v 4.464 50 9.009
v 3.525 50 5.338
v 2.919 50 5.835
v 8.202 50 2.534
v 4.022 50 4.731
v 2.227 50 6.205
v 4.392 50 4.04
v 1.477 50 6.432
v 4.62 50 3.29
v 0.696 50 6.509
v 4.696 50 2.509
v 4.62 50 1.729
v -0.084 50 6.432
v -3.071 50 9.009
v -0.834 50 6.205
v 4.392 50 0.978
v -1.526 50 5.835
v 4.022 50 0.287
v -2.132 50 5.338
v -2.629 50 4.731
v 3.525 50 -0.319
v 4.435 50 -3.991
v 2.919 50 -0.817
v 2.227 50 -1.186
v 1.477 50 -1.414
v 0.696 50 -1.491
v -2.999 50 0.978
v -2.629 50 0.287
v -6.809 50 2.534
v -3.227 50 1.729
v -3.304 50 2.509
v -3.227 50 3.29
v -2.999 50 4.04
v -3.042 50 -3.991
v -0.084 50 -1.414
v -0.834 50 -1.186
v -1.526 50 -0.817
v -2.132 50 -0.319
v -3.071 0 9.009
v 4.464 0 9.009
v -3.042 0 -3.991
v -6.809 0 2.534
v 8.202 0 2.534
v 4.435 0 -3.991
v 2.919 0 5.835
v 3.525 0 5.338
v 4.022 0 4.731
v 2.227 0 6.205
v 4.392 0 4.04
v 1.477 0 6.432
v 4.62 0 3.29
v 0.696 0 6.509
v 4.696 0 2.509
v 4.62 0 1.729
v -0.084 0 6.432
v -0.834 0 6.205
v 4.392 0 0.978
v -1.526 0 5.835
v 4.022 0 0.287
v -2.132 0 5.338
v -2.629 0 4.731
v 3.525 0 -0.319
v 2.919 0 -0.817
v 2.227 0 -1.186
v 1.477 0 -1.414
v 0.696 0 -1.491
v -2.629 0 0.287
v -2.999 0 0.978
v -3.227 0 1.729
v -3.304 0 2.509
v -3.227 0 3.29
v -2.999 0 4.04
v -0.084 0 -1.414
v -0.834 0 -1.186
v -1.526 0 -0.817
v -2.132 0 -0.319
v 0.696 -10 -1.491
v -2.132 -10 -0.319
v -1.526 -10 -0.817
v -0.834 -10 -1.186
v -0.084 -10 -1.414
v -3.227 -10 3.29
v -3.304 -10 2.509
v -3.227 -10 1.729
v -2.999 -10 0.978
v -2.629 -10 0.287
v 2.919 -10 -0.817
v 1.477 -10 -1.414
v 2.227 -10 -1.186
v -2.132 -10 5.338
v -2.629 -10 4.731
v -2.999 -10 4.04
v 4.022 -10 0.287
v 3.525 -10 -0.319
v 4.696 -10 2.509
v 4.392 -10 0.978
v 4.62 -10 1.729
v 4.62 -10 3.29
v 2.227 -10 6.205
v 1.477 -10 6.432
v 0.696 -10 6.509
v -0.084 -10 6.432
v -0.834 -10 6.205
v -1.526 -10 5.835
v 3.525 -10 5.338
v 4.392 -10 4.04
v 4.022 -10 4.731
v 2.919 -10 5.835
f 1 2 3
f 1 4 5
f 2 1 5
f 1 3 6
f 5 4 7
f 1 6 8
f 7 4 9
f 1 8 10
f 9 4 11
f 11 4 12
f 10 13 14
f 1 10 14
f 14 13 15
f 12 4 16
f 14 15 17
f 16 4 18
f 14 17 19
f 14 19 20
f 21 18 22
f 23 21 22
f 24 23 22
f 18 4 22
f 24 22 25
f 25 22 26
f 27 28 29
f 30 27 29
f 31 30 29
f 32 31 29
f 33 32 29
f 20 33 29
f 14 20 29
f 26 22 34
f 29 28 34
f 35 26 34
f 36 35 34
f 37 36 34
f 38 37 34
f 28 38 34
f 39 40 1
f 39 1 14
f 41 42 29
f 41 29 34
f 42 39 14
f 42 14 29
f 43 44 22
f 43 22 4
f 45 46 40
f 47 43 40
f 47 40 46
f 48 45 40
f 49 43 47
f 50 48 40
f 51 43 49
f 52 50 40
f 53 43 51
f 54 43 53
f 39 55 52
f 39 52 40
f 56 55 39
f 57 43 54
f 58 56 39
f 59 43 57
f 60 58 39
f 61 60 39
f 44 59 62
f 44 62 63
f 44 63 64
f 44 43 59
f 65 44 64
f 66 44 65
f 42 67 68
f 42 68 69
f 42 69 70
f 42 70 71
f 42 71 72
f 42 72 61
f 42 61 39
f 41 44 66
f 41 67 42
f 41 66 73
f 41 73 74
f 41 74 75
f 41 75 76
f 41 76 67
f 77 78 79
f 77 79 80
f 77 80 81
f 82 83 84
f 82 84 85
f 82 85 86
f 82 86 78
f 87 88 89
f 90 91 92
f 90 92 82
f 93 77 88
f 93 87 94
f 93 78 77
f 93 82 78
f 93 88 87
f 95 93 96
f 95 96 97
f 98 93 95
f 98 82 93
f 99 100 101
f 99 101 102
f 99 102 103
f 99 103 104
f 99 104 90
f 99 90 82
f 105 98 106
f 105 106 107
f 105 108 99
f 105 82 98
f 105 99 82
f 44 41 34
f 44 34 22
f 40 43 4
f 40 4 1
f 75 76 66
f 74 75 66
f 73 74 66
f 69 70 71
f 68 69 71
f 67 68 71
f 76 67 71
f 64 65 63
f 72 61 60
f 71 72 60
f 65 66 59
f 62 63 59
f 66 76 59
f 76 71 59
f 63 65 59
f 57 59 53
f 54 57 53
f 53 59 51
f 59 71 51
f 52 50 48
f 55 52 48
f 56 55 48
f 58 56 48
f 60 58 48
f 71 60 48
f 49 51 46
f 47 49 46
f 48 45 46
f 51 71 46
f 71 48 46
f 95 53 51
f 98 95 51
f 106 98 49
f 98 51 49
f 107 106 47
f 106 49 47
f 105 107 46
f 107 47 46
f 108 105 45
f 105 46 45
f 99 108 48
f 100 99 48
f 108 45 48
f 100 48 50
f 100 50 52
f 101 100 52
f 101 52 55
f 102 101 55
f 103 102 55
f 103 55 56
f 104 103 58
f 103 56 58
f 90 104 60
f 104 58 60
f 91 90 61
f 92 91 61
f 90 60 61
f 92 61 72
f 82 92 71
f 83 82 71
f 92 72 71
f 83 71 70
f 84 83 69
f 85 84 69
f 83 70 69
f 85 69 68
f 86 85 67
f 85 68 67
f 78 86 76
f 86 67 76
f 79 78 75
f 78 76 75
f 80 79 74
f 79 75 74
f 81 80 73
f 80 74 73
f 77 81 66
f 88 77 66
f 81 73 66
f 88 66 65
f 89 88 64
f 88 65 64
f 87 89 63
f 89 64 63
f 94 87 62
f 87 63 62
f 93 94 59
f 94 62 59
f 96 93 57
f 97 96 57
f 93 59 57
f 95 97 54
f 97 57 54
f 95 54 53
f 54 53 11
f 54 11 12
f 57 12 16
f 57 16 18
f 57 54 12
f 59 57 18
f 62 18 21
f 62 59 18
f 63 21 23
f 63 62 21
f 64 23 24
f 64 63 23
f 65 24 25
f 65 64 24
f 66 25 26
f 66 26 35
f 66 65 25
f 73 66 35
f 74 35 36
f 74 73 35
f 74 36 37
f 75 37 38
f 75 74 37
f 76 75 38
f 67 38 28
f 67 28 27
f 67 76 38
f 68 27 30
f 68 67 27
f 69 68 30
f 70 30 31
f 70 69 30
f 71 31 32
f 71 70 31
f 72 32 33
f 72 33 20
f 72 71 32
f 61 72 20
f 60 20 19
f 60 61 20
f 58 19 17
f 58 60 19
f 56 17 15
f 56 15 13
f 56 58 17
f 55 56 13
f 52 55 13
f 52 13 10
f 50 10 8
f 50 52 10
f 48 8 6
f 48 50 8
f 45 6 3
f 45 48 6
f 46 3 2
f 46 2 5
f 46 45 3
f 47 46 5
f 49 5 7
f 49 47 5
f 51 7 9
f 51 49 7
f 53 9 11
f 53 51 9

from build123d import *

# Parameters (mm, degrees)
SKETCH_1_R      = 4
EXTRUDE_1_DEPTH = 50
SKETCH_2_R      = 4
EXTRUDE_2_DEPTH = 10


with BuildPart() as part:
    # 草图1 → 凸台-拉伸1 (new body)
    with BuildSketch(Plane(origin=(0, 0, 0), x_dir=(1, 0, 0), z_dir=(0, 1, 0))):
        Polygon((-3.041910015, 3.990808824), (4.434714707, 3.990808824), (8.201955845, -2.534244233), (4.463643484, -9.009191176), (-3.070838793, -9.009191176), (-6.809151154, -2.534244233), align=None)
        with Locations((0.696402346, -2.509191176)):
            Circle(SKETCH_1_R, mode=Mode.SUBTRACT)
    extrude(amount=EXTRUDE_1_DEPTH)


with BuildPart() as body_2:
    # 草图2 → 凸台-拉伸2 (new body)
    with BuildSketch(Plane.XZ):
        with Locations((0.696402346, 2.509191176)):
            Circle(SKETCH_2_R)
    extrude(amount=EXTRUDE_2_DEPTH)


solid = Compound([part.part, body_2.part])
